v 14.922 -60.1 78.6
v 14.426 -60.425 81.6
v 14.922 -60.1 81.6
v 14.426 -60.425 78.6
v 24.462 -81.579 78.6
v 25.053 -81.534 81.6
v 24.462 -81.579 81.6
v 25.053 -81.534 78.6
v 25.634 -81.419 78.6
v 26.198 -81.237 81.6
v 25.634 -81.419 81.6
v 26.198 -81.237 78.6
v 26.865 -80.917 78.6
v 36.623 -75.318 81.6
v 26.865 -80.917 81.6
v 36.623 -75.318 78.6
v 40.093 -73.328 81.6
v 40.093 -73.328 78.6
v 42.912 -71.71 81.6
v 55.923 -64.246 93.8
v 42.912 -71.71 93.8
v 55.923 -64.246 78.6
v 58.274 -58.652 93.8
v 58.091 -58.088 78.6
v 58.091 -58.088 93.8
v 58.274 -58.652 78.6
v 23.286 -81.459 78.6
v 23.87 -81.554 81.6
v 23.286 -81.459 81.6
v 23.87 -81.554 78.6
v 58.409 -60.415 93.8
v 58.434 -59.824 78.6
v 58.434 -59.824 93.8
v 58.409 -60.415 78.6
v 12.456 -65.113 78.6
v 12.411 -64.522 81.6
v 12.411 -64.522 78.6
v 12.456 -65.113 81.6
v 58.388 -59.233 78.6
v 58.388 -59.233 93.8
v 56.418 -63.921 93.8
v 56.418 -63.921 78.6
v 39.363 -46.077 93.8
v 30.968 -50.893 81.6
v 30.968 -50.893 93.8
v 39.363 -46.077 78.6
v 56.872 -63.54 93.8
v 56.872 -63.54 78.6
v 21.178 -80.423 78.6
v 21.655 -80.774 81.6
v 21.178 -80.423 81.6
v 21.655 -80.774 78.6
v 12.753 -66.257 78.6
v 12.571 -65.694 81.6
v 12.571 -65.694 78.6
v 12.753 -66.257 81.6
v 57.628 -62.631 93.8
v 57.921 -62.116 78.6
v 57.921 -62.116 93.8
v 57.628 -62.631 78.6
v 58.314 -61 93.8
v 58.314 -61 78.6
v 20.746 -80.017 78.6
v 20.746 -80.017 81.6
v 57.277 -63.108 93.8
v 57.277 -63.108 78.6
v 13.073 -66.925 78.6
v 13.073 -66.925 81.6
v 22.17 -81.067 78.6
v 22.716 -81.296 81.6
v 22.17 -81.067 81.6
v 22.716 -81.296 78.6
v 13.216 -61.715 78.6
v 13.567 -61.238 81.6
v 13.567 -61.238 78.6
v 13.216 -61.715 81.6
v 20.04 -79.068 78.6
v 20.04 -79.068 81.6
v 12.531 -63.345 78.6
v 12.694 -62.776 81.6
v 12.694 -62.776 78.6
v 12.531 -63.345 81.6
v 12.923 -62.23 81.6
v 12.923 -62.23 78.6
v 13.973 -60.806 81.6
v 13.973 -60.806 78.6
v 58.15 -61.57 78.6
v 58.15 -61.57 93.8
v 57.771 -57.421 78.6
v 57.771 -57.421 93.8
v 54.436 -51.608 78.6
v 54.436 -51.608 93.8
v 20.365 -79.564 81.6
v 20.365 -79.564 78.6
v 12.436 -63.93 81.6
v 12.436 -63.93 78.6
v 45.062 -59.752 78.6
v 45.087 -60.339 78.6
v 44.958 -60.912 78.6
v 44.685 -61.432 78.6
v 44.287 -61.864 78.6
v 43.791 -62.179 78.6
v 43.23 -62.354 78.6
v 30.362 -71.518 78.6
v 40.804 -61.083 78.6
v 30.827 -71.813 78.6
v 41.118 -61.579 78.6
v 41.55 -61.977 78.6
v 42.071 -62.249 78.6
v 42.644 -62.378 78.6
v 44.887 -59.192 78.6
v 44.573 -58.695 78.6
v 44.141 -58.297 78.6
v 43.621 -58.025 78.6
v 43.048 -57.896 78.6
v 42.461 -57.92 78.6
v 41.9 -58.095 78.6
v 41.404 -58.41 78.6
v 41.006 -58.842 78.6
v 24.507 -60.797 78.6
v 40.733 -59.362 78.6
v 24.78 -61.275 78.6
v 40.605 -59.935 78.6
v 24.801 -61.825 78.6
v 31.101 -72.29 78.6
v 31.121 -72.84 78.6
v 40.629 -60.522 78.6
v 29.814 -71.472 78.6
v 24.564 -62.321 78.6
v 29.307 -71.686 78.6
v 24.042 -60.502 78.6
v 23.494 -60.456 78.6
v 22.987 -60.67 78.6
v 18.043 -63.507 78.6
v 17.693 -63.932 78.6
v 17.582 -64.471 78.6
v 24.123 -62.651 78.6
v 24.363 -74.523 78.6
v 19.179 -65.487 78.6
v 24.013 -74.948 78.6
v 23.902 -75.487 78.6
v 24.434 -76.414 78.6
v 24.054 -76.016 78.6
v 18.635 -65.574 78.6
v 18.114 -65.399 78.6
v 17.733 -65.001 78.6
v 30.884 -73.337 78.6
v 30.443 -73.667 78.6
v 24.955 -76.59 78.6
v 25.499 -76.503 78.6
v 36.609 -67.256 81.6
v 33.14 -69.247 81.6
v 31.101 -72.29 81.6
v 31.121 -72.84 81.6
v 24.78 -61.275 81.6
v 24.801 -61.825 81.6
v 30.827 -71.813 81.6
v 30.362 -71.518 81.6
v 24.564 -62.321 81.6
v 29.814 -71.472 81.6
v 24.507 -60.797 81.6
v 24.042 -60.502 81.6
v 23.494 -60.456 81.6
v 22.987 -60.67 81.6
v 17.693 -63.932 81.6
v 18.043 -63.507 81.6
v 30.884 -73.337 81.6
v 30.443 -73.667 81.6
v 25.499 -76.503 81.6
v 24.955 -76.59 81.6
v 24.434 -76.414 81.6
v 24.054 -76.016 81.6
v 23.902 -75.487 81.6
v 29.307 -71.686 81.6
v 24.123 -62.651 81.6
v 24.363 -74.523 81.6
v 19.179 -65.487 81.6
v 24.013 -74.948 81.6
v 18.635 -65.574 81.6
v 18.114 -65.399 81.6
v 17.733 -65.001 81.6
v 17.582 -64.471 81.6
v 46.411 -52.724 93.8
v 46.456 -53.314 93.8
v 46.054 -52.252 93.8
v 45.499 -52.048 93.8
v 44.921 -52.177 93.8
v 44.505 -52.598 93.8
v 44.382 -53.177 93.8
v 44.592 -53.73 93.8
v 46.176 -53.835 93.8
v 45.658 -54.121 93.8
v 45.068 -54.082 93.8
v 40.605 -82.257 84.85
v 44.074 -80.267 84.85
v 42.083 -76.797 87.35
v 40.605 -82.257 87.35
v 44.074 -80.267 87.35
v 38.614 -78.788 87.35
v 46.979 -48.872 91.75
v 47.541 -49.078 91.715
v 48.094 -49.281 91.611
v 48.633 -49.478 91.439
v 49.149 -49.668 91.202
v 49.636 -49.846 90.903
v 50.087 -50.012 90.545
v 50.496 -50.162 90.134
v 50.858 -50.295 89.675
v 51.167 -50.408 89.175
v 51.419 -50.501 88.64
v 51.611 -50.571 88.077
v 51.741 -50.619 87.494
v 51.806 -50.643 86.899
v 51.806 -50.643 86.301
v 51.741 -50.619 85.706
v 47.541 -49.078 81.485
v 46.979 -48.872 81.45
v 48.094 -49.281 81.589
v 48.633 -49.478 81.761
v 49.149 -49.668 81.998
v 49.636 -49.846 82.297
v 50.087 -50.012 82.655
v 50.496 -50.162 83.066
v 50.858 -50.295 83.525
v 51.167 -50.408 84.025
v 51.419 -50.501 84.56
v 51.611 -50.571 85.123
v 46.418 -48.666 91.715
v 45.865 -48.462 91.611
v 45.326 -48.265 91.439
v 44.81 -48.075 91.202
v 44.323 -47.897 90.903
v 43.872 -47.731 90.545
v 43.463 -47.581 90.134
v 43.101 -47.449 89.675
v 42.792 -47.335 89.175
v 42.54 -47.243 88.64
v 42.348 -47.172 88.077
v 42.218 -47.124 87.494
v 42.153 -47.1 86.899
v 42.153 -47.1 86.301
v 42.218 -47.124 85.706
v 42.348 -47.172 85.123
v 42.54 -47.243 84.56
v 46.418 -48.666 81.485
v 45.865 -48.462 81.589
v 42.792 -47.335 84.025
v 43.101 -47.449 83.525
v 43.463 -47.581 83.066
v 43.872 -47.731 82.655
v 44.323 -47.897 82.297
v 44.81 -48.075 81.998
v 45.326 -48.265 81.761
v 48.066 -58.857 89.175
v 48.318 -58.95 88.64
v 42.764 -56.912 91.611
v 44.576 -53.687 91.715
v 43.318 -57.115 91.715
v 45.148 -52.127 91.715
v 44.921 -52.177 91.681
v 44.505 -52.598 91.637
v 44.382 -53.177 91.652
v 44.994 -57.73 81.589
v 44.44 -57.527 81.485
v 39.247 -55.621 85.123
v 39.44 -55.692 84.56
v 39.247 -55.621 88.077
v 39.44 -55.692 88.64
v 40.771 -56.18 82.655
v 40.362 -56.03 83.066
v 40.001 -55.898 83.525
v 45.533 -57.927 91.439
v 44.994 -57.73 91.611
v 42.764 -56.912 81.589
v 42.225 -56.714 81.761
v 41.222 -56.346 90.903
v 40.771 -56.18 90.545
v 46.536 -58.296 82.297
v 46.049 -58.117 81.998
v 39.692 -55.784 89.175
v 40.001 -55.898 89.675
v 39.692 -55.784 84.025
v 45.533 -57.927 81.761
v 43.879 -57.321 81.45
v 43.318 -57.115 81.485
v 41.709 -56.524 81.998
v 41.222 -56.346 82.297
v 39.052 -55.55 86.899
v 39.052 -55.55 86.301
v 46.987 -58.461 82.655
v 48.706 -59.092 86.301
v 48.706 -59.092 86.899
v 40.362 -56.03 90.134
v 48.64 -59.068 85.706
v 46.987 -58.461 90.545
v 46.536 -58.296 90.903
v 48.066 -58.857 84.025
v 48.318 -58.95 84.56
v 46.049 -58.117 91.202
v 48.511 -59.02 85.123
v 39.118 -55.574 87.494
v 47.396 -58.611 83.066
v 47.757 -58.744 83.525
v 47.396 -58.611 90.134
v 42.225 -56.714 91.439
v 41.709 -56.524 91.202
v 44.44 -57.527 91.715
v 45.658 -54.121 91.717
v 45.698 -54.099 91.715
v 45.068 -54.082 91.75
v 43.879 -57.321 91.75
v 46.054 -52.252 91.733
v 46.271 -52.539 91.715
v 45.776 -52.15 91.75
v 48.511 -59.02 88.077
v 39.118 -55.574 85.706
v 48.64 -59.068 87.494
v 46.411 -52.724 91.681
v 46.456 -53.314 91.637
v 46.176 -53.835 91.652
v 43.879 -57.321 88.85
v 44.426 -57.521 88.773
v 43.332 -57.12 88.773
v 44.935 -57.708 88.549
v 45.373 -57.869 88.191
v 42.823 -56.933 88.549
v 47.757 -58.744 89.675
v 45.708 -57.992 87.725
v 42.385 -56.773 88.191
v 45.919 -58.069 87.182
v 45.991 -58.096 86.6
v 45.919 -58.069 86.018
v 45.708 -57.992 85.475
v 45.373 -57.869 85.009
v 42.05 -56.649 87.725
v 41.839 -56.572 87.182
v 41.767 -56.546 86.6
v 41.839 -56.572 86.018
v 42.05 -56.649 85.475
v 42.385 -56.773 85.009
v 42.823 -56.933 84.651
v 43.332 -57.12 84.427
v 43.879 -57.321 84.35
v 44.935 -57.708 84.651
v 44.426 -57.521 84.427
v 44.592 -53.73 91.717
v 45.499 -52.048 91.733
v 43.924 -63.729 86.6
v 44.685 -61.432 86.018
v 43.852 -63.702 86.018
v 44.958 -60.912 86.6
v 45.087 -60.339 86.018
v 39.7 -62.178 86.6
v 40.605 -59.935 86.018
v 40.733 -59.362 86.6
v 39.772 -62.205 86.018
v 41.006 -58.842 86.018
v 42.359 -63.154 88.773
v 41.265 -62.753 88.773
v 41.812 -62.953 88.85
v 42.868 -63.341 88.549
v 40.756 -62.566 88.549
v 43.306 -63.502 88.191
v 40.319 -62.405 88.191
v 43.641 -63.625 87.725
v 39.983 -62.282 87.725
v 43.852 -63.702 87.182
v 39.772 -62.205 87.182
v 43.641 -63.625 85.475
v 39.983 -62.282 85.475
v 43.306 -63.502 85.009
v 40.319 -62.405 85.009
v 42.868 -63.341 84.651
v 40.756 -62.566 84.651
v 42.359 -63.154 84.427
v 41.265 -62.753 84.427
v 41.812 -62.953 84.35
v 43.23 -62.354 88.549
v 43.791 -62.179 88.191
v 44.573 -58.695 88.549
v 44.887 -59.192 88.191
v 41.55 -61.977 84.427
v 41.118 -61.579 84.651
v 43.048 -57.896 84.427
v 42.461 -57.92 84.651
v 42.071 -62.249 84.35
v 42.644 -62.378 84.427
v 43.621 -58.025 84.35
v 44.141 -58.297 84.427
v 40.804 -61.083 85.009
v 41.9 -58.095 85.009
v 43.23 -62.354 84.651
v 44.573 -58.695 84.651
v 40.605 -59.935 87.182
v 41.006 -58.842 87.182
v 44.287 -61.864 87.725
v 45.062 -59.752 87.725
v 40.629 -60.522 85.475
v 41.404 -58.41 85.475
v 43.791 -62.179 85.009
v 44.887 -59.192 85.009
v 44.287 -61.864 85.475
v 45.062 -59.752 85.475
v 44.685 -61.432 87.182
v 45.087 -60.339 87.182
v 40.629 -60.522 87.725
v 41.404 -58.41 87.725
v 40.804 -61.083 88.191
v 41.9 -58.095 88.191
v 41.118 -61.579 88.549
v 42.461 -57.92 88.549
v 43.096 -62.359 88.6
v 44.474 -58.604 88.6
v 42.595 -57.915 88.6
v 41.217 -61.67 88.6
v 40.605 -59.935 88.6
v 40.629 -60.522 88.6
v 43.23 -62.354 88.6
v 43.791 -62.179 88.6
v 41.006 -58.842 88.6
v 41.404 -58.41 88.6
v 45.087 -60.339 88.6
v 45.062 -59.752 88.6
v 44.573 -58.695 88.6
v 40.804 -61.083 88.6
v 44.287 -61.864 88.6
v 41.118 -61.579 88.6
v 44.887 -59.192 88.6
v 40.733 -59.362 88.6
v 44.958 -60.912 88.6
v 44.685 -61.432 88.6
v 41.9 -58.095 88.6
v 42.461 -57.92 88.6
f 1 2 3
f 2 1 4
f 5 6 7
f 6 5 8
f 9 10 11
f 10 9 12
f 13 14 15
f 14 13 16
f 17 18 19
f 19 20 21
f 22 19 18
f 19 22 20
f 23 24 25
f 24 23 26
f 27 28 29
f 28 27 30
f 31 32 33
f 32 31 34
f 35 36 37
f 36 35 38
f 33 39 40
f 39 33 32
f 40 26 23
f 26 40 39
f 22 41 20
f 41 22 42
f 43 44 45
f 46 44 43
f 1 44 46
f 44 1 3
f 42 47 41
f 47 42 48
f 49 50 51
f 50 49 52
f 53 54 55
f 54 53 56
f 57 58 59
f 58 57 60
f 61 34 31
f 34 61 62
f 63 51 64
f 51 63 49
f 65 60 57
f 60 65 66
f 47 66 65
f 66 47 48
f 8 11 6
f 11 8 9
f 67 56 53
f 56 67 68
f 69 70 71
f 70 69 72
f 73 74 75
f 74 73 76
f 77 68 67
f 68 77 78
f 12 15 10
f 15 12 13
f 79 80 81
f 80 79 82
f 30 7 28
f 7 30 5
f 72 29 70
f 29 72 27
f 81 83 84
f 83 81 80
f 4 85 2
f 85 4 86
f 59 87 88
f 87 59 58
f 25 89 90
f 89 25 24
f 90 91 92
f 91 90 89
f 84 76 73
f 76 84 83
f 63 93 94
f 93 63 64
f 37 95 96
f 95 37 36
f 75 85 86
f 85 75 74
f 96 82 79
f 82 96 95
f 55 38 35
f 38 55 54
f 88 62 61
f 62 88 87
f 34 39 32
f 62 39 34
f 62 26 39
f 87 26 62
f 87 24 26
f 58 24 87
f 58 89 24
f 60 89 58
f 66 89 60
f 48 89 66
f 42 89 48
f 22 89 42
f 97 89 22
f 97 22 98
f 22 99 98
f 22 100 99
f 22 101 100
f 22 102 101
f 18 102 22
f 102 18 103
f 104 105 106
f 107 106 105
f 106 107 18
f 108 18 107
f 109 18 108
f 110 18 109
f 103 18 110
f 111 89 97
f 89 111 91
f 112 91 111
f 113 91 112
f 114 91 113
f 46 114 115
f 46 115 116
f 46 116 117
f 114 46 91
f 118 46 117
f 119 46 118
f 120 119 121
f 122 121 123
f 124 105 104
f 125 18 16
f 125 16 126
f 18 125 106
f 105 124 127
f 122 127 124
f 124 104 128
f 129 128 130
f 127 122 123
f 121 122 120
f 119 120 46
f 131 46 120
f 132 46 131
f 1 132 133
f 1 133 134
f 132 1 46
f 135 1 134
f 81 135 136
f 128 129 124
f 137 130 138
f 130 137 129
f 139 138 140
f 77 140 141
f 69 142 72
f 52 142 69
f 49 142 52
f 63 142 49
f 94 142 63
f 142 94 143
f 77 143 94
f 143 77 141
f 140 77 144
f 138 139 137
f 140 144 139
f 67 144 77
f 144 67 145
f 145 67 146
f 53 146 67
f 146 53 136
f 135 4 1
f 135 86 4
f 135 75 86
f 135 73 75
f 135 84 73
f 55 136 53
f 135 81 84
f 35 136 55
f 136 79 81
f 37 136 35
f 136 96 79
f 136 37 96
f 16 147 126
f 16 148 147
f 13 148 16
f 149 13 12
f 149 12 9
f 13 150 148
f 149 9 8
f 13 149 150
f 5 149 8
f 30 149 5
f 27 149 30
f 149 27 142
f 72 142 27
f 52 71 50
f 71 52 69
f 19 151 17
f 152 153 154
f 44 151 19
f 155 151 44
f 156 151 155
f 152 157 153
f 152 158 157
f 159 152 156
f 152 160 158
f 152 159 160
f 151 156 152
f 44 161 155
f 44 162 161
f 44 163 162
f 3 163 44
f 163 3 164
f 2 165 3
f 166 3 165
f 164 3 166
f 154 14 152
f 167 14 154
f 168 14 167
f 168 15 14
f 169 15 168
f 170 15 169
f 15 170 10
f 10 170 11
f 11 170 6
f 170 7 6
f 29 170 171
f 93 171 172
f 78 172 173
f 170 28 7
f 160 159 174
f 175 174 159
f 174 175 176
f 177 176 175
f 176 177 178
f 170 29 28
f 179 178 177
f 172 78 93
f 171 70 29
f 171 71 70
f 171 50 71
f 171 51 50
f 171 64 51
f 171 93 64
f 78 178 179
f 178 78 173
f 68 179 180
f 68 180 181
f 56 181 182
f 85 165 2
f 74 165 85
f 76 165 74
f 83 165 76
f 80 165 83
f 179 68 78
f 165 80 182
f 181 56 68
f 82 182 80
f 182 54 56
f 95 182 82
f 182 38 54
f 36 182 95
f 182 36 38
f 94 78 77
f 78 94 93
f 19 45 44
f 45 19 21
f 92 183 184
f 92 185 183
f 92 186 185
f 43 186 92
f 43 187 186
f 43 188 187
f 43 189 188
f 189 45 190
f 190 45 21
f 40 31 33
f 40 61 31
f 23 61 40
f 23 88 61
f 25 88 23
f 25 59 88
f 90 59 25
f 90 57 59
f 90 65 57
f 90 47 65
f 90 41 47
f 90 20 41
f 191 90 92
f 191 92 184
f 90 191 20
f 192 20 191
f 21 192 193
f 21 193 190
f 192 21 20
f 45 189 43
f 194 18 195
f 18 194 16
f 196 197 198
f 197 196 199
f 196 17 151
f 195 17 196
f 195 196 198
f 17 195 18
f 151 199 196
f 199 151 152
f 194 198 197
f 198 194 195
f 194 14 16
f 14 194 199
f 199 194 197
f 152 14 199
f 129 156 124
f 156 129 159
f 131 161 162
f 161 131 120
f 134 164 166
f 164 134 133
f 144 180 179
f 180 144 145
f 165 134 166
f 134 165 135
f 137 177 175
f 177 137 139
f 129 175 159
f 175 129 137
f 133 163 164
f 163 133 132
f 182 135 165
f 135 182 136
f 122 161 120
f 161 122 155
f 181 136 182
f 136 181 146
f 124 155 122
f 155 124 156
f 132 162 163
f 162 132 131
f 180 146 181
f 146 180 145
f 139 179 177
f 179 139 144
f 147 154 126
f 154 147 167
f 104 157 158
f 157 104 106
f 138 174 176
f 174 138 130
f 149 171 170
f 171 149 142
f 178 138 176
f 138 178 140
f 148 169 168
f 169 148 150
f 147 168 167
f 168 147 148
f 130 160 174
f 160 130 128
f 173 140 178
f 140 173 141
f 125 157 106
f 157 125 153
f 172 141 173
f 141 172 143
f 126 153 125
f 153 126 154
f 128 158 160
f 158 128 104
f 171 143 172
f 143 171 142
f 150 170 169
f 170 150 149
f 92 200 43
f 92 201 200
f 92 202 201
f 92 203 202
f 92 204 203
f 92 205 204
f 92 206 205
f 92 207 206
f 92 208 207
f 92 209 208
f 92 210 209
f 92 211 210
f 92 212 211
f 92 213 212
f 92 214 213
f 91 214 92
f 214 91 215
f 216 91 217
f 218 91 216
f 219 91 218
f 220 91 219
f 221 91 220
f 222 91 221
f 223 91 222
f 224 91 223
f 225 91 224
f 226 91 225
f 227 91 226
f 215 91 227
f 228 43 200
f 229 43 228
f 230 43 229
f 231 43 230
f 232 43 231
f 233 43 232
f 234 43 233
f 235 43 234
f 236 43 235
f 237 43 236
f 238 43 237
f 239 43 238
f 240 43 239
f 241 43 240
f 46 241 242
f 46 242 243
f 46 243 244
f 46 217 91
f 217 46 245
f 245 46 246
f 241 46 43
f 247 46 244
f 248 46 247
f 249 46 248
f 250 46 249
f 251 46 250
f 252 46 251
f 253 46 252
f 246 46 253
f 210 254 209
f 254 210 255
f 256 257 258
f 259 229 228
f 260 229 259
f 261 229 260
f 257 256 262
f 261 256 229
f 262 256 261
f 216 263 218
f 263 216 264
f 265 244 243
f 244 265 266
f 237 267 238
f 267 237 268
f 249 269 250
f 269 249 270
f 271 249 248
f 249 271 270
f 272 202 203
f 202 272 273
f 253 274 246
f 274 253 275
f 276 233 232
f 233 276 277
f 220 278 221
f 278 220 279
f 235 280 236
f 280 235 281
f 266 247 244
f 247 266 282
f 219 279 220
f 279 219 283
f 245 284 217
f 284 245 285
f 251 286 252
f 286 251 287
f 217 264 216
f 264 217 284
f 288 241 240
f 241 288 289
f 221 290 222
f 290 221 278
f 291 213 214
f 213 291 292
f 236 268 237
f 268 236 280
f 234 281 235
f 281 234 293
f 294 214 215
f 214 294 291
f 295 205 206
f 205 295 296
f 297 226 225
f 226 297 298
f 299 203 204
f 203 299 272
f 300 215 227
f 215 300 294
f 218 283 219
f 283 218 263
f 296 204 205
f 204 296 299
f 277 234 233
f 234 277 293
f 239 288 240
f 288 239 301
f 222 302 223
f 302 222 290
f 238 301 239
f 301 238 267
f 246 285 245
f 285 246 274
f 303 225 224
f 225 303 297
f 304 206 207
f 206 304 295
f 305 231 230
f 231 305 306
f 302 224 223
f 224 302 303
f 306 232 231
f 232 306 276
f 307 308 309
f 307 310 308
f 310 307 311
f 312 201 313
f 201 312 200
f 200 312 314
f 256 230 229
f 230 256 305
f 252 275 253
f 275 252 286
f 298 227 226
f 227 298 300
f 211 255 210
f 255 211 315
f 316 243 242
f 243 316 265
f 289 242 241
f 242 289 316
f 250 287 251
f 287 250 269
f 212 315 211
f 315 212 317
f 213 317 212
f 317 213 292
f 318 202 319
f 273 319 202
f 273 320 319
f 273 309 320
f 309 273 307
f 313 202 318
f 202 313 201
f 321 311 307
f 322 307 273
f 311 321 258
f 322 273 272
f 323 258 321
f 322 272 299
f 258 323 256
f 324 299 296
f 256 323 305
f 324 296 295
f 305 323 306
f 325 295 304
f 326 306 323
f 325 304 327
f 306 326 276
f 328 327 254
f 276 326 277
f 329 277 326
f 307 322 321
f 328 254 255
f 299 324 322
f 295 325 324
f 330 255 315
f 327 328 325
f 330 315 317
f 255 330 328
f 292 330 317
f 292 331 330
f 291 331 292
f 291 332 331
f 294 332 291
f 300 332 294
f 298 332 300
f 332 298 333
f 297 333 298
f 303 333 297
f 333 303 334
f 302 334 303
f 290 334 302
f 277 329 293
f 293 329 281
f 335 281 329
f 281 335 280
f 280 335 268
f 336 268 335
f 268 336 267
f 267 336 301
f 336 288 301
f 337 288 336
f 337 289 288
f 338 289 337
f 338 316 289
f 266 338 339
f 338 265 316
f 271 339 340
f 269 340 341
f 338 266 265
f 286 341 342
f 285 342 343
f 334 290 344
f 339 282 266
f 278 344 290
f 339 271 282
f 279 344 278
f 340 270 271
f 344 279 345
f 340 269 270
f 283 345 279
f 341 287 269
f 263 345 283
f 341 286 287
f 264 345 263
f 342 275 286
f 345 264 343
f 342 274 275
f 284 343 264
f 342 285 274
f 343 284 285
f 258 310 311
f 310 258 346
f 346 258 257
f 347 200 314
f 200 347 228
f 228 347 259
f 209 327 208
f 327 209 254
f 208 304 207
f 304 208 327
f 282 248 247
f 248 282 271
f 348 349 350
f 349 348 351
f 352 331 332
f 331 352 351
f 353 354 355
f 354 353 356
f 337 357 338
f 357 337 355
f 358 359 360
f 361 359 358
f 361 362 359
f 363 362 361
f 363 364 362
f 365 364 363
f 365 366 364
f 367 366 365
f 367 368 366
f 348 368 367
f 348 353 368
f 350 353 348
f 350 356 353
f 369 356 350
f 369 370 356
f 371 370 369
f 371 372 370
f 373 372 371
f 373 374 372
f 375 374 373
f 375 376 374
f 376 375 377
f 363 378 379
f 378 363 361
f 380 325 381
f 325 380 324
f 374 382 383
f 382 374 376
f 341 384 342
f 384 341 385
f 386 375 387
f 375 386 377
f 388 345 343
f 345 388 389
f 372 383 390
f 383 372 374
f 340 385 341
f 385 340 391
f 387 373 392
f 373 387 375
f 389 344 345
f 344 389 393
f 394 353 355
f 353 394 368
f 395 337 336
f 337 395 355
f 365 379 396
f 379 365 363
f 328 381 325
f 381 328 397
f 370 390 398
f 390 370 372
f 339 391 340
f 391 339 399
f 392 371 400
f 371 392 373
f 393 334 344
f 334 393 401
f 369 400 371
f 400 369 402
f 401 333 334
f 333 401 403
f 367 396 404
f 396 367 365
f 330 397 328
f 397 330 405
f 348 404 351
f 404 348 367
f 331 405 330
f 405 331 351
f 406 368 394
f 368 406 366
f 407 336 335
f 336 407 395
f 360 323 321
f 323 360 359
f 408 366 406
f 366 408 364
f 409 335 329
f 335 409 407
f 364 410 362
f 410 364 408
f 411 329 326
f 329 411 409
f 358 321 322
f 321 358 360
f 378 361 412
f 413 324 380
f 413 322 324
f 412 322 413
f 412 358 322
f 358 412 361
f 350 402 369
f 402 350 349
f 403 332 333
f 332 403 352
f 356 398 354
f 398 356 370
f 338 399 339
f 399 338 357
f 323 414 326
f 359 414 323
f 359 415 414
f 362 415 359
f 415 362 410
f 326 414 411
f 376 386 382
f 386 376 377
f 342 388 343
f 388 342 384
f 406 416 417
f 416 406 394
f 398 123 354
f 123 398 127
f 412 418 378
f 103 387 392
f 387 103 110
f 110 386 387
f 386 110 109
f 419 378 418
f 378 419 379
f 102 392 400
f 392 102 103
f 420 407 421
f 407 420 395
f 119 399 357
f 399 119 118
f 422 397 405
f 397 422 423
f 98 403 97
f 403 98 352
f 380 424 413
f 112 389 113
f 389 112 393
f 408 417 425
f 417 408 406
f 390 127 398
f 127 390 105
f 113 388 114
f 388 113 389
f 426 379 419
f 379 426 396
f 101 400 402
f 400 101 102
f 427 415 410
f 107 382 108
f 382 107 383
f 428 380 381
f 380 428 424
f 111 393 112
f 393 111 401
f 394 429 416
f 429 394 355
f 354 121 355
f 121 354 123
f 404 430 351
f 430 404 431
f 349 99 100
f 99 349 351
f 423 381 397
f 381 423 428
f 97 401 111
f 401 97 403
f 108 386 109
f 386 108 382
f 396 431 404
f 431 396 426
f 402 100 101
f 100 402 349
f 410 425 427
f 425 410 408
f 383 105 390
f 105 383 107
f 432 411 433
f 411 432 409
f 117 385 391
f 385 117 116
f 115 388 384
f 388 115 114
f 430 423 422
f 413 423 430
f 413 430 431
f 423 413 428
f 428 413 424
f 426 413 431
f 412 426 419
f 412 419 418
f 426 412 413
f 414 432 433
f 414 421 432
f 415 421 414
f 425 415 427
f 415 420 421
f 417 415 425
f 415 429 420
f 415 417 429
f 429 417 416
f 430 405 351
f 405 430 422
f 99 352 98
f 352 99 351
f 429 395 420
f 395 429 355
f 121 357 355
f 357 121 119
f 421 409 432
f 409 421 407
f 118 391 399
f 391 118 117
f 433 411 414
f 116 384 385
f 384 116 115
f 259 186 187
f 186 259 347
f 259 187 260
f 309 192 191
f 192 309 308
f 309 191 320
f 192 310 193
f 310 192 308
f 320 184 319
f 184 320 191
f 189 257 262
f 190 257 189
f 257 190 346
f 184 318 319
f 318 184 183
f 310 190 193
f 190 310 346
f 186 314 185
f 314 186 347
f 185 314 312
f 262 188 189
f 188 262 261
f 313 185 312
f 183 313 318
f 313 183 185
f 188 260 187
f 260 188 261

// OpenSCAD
// file: ../lib/common.scad
// ============================================================================
//  Вспомогательные модули общего назначения.
//  Подключать через use <lib/common.scad> — файл не содержит параметров
//  проекта и ни от чего не зависит.
// ============================================================================

_eps = 0.01;

// --------------------------------------------------------------------- 2D ---
// Прямоугольник со скруглёнными углами, по центру
module rrect(w, d, r) {
    rr = min(r, w/2 - _eps, d/2 - _eps);
    if (rr > 0) offset(r = rr) square([w - 2*rr, d - 2*rr], center = true);
    else square([w, d], center = true);
}

// --------------------------------------------------------------------- 3D ---
// Коробка со скруглением ТОЛЬКО вертикальных рёбер: нижние и верхние острые
module rounded_box(w, d, h, r) linear_extrude(height = h) rrect(w, d, r);

// Цилиндр с фасками на торцах (снимает «слоновью ногу» и облегчает посадку)
module chamfered_cyl(d, h, ch = 0.6, bottom = true, top = true) {
    r  = d/2;
    cb = bottom ? min(ch, h/2) : 0;
    ct = top    ? min(ch, h/2) : 0;
    if (cb <= 0 && ct <= 0) cylinder(d = d, h = h);
    else rotate_extrude(angle = 360) polygon(concat(
        [[0, 0]],
        cb > 0 ? [[r - cb, 0], [r, cb]] : [[r, 0]],
        ct > 0 ? [[r, h - ct], [r - ct, h]] : [[r, h]],
        [[0, h]]));
}

// Труба
module tube(od, id, h) difference() {
    cylinder(d = od, h = h);
    translate([0, 0, -_eps]) cylinder(d = id, h = h + 2*_eps);
}

// Сквозное отверстие, растянутое вверх-вниз для гарантированного вычитания
module thru(d, h) translate([0, 0, -_eps]) cylinder(d = d, h = h + 2*_eps);

// Потайное отверстие под саморез с конической головкой.
// Пластина занимает z = [0 .. t], головка утапливается сверху,
// саморез идёт вниз (в ответную стойку).
module countersunk_hole(free_d, head_d, t, down = 30) {
    cone_h = (head_d - free_d)/2;    // головка 90 градусов
    union() {
        translate([0, 0, -down]) cylinder(d = free_d, h = down + t - cone_h + _eps);
        translate([0, 0, t - cone_h]) cylinder(d1 = free_d, d2 = head_d, h = cone_h);
    }
}

// Паз (щелевое отверстие) длиной len по X, сквозной по высоте h
module slot(len, d, h) hull() for (s = [-1, 1])
    translate([s*(len - d)/2, 0, 0]) cylinder(d = d, h = h);

// Стойка под саморез: цилиндр с пилотным отверстием сверху.
// Снизу фаски нет — стойка растёт из дна детали.
module screw_boss(od, h, pilot_d, pilot_depth, ch = 0.6) difference() {
    chamfered_cyl(od, h, ch = ch, bottom = false, top = true);
    translate([0, 0, h - pilot_depth]) cylinder(d = pilot_d, h = pilot_depth + _eps);
}

// Треугольная косынка в плоскости XZ (катеты l по X и h по Z), толщина t по Y
module gusset(l, h, t) translate([0, -t/2, 0]) linear_extrude(height = t)
    polygon([[0, 0], [l, 0], [0, h]]);

// Конусное гнездо под заточенный винт-ось (ось Z вниз от z=0)
module cone_seat(d, depth) translate([0, 0, -depth])
    cylinder(d1 = 0.2, d2 = d, h = depth + _eps);

// Канавка под круглый пассик: тор, вычитаемый из обода
module belt_groove(pulley_d, groove_r) rotate_extrude(angle = 360)
    translate([pulley_d/2, 0]) circle(r = groove_r);

// Сетка облегчающих отверстий по кругу
module radial_holes(n, r, d, h) for (i = [0 : n - 1])
    rotate([0, 0, i*360/n]) translate([r, 0, 0]) thru(d, h);
// main file
// ============================================================================
//  ГОЛОВКА (площадка под звукосниматель) — съёмная
//
//  Устройство простое: скруглённая площадка, на её задней части поднят
//  «нарост» того же контура, в нём под углом гнездо под трубку тонарма.
//  Задний угол срезан одной плоскостью перпендикулярно трубке — это вход
//  гнезда. Трубка входит до упора в глухое дно (упор задаёт эффективную
//  длину) и тянется винтом M2.5 сверху по лыске (лыска задаёт повторяемый
//  угол разворота). Больше в стыке ничего нет.
//
//  Зачем разъём: иначе сигнальный провод в тонарм не завести — трубка
//  оказывается заглушена со стороны головки. Плюс так можно поменять
//  звукосниматель, не разбирая тонарм.
//
//  Под AT91: пазы 1/2" с шагом 12.7 мм дают регулировку выноса +-4 мм.
//  Провод идёт дальше по оси трубки и выходит снизу площадки сразу позади
//  корпуса головки — как раз к её лепесткам.
//
//  Печать: площадкой на стол, наростом вверх, без поддержек.
// ============================================================================

include <../params.scad>
use <../lib/common.scad>

module tonearm_headshell(az = arm_tube_azimuth_at(arm_groove_r_out)) {
    // Пальцевой упор стоит в просвете между наростом и пазами крепления:
    // над пазами нельзя (нужен свободный ход винта и доступ отвёрткой),
    // впереди пазов площадка кончается у самой иглы.
    lift_w = 4;
    lift_x = (arm_shell_pad_x + arm_shell_slot_x - cart_slot_len/2)/2;

    // Контур площадки — одна скруглённая пластина
    module profile()
        translate([(arm_shell_front - arm_shell_rear)/2, 0])
            rrect(arm_shell_front + arm_shell_rear, arm_headshell_w, arm_shell_r);

    translate([arm_pivot_pos[0], arm_pivot_pos[1], arm_axis_z]) rotate([0, 0, az])
    difference() {
        translate([arm_tube_reach, 0, 0]) rotate([0, 0, -arm_headshell_angle]) {
            // площадка
            translate([0, 0, arm_shell_bot])
                linear_extrude(height = arm_headshell_t) profile();
            // нарост: тот же контур, поднят до верха гнезда
            translate([0, 0, arm_shell_bot])
                linear_extrude(height = arm_shell_pad_z - arm_shell_bot)
                    intersection() {
                        profile();
                        translate([-arm_shell_rear - 1, -arm_headshell_w])
                            square([arm_shell_pad_x + arm_shell_rear + 1,
                                    2*arm_headshell_w]);
                    }
            // «пальцевой» упор — за него берут тонарм. Уходит на внешнюю
            // сторону (от центра диска) и вверх, чтобы палец не проходил
            // над пластинкой.
            hull() {
                translate([lift_x, arm_headshell_w/2 - 3.5,
                           arm_shell_bot + arm_headshell_t/2])
                    cube([lift_w, 7, arm_headshell_t], center = true);
                translate([lift_x, arm_headshell_w/2 + 6,
                           arm_shell_bot + arm_headshell_t/2 + 6])
                    cube([lift_w, 4, 2.5], center = true);
            }
        }
        // ---- пазы крепления головки (регулировка выноса +-4 мм) ----
        translate([arm_tube_reach, 0, 0]) rotate([0, 0, -arm_headshell_angle])
            for (s = [-1, 1])
                translate([arm_shell_slot_x, s*cart_screw_spacing/2,
                           arm_shell_bot - eps])
                    slot(cart_slot_len, cart_screw_d, arm_headshell_t + 2*eps);
        // ---- вход гнезда: плоскость перпендикулярно трубке ----
        translate([arm_tube_reach - arm_joint_len - 100, -100, -100])
            cube([100, 200, 200]);
        // ---- гнездо трубки: глухое, дно на торце трубки ----
        translate([arm_tube_reach - arm_joint_len - 2, 0, 0]) rotate([0, 90, 0])
            cylinder(d = arm_socket_d, h = arm_joint_len + 2);
        // ---- канал провода: продолжение гнезда той же осью ----
        translate([arm_tube_reach - 1, 0, 0]) rotate([0, 90, 0])
            cylinder(d = arm_wire_exit_d, h = arm_wire_chan_fwd + 1);
        // ---- выход провода вниз, сразу позади корпуса головки ----
        translate([arm_tube_reach + 3, 0, arm_shell_bot - 1])
            cylinder(d = arm_wire_exit_d, h = -arm_shell_bot + 3);
        // ---- прижимной винт: сверху нароста в лыску трубки ----
        translate([arm_tube_reach - arm_joint_len/2, 0, arm_joint_scr_z - 0.5])
            cylinder(d = scr25_pilot, h = arm_shell_pad_t + 2);
    }
}

tonearm_headshell();
